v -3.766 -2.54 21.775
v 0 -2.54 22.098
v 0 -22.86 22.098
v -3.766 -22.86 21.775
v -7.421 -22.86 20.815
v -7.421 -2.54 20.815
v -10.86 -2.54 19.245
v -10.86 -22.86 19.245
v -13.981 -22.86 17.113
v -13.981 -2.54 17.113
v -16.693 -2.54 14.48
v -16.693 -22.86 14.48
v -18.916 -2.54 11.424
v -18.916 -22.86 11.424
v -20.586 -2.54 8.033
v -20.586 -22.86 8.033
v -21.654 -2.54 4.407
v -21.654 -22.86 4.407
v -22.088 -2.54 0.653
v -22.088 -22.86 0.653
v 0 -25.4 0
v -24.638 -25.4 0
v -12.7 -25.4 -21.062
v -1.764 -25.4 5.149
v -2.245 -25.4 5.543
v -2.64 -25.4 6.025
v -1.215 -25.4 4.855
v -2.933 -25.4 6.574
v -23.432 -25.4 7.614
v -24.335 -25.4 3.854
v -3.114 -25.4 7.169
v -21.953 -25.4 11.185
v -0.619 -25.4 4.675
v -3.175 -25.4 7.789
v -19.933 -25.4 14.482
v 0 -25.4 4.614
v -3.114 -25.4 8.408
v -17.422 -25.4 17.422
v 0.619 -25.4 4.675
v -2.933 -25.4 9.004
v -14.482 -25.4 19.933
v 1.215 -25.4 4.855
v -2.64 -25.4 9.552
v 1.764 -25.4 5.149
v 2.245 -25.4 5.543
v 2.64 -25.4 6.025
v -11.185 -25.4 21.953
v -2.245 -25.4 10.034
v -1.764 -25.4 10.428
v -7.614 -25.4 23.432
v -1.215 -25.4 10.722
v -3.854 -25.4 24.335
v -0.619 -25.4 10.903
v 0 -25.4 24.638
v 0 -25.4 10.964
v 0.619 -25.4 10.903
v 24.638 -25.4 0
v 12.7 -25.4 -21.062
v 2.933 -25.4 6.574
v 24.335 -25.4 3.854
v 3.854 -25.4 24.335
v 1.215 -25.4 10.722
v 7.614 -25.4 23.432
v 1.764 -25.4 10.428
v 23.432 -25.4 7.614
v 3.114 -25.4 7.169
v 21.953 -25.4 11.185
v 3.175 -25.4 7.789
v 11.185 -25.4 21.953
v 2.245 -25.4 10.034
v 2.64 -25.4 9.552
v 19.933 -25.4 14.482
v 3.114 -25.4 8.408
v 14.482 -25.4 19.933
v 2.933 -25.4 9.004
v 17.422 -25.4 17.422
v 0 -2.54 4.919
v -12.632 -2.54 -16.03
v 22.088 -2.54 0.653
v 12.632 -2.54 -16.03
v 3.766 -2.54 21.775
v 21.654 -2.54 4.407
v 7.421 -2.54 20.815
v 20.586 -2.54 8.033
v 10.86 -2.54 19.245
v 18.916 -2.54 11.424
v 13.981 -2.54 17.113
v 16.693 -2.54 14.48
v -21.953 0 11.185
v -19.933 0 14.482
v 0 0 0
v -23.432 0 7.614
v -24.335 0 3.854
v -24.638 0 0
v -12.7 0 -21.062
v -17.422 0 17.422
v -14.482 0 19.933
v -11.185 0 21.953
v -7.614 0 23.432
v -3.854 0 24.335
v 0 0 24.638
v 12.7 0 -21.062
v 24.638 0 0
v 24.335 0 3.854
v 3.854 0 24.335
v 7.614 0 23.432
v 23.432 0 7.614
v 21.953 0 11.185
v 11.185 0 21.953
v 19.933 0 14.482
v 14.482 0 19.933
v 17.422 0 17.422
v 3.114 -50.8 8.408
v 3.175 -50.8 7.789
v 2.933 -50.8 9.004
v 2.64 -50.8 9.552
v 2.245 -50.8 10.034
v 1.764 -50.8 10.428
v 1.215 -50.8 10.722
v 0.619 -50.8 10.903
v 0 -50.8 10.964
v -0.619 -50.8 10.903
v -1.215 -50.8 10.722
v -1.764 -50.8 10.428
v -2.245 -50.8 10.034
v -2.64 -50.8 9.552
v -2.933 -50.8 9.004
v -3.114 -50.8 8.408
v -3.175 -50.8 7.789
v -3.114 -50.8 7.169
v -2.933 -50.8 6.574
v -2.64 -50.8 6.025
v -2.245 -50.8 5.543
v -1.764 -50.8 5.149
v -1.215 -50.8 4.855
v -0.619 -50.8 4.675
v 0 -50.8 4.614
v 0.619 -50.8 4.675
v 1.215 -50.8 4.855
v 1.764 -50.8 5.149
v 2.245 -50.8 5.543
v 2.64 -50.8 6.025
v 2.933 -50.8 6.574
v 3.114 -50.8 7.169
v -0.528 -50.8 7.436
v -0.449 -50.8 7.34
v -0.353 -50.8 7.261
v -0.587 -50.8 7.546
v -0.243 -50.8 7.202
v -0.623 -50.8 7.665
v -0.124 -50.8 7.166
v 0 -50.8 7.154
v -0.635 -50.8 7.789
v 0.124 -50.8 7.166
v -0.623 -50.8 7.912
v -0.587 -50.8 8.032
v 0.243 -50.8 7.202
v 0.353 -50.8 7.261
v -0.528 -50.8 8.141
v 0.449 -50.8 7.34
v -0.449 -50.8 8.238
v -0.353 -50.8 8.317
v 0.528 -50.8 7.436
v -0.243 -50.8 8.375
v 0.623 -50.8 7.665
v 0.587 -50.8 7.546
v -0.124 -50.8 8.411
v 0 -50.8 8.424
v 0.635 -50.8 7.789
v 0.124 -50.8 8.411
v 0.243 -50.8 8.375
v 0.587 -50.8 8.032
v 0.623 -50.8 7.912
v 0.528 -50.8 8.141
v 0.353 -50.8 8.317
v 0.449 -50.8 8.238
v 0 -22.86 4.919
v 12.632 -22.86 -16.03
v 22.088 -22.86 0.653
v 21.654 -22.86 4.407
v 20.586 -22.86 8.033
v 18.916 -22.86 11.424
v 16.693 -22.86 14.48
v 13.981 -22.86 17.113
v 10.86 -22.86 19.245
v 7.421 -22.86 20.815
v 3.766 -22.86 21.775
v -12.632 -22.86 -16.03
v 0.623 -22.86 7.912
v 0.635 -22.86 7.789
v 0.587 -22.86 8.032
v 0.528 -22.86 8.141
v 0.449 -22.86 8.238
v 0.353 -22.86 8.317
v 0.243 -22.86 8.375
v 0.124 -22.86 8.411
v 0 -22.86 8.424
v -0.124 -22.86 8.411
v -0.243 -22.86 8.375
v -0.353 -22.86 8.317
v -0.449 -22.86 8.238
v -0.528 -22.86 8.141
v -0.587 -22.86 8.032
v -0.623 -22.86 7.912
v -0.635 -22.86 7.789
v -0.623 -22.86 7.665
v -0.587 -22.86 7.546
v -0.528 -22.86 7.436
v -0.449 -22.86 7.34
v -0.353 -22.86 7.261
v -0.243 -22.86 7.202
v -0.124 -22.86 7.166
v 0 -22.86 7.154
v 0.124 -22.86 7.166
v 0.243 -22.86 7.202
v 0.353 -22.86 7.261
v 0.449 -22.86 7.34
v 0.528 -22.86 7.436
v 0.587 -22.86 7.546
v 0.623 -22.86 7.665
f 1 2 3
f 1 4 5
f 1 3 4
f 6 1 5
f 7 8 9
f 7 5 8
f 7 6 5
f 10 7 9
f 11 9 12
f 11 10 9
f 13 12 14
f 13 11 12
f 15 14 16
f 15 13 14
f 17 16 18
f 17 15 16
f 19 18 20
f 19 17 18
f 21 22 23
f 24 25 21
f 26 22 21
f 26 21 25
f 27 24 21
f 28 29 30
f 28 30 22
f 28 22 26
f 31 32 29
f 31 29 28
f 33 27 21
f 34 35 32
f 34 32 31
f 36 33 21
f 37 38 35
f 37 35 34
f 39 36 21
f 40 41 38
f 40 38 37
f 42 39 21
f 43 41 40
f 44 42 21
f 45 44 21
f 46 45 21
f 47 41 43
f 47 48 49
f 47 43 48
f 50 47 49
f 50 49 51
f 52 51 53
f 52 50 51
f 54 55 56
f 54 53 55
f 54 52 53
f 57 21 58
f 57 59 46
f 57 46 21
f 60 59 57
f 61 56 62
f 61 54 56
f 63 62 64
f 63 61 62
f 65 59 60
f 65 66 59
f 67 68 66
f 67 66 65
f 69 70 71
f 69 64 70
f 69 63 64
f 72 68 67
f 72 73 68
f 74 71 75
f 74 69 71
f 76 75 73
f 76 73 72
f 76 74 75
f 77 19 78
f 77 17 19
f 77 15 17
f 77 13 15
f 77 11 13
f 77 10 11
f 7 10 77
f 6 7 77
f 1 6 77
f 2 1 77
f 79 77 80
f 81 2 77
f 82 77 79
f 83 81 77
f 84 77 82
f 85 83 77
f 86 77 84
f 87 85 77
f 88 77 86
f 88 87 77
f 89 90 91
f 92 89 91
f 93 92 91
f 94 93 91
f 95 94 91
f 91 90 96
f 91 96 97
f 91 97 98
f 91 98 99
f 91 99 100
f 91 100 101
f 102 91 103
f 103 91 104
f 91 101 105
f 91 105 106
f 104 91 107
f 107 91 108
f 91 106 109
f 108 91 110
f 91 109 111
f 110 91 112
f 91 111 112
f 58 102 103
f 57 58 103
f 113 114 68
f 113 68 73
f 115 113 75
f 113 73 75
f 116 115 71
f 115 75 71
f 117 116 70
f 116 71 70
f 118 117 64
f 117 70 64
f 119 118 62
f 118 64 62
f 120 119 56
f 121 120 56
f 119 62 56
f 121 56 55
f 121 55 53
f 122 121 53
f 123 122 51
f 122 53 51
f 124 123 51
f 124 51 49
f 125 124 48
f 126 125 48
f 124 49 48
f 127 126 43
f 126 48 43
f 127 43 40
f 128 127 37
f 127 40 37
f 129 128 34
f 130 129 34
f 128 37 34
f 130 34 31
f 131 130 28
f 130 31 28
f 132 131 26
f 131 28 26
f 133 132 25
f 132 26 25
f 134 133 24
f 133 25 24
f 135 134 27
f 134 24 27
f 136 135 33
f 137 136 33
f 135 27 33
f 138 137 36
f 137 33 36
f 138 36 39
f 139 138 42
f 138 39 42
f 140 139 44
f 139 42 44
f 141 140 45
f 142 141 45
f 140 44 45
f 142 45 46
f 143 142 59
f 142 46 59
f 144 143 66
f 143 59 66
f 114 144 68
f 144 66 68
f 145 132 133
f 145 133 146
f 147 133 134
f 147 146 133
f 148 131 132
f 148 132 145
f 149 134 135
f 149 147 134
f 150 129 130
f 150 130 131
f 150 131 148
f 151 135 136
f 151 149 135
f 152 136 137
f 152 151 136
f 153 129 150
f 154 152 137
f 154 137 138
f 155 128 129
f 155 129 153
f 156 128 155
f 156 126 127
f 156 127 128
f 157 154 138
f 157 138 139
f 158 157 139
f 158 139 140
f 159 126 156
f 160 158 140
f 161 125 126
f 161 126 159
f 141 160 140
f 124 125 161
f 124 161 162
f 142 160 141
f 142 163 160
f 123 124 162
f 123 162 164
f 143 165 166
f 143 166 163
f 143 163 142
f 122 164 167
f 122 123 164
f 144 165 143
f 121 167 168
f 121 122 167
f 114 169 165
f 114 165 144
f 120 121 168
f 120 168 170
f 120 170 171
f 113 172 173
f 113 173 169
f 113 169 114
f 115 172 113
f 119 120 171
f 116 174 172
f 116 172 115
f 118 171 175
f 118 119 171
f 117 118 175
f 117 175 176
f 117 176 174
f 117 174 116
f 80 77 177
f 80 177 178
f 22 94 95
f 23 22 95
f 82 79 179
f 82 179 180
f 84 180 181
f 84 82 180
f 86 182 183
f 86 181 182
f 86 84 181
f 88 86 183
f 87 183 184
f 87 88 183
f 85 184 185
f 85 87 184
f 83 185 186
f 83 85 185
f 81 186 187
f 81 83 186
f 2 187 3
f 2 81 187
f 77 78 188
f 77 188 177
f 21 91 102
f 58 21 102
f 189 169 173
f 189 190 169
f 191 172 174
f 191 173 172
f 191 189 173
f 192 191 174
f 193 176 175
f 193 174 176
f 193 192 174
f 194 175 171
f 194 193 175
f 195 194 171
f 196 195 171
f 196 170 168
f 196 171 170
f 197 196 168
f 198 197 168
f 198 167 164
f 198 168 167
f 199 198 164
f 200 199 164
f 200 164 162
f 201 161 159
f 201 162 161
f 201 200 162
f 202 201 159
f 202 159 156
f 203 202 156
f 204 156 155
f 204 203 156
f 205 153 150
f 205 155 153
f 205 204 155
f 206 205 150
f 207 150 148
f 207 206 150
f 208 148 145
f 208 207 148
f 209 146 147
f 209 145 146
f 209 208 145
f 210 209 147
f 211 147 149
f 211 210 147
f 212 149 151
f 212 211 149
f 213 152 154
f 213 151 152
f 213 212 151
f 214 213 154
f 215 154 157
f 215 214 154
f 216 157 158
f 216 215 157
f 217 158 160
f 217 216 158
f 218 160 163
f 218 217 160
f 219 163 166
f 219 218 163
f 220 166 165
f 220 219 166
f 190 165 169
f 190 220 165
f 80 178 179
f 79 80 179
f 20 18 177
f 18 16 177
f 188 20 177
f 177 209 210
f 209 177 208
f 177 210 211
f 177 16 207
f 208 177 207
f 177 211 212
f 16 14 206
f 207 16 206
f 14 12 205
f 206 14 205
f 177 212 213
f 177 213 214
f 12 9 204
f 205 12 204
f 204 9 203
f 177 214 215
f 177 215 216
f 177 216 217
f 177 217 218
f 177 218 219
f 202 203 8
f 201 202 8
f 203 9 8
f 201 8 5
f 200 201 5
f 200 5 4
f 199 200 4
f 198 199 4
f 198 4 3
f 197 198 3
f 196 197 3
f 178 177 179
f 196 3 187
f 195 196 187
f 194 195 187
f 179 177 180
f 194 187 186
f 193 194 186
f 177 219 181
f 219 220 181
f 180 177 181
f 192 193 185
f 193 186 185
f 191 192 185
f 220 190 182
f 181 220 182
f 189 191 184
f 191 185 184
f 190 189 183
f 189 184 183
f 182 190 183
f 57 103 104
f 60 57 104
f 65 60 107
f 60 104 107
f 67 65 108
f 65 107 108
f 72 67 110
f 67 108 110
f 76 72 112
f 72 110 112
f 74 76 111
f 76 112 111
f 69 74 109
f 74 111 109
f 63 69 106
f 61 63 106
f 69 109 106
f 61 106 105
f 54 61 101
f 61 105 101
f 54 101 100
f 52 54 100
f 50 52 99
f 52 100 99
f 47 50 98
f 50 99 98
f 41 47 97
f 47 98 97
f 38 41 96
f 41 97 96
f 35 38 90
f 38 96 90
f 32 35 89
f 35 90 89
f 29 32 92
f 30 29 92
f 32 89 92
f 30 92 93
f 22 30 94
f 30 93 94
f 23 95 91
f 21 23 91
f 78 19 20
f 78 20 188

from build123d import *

# Parameters (mm, degrees)
F1_DEPTH = 25.4
F2_R     = 3.175
F3_DEPTH = 25.4
F4_T     = -2.54


with BuildPart() as f1:
    # F0 (on Front) → F1 (new body)
    with BuildSketch(Plane.XZ):
        with BuildLine():
            ThreePointArc((24.638, 0), (17.4216968749, 17.4216968749), (0, 24.638))
            ThreePointArc((0, 24.638), (-17.4216968749, 17.4216968749), (-24.638, 0))
            Line((-24.638, 0), (-12.7, -21.0615165602))
            Line((-12.7, -21.0615165602), (0, 0))
            Line((0, 0), (12.7, -21.0615165602))
            Line((12.7, -21.0615165602), (24.638, 0))
        make_face()
    extrude(amount=F1_DEPTH)

    # F2 (on face) → F3 (join)
    with BuildSketch(Plane.XZ.offset(25.4)):
        with Locations((0, 7.7885312092)):
            Circle(F2_R)
    extrude(amount=F3_DEPTH)

    # F4
    f4_openings = [f1.faces().sort_by_distance(p)[0] for p in [
        (0, -50.8, 7.788531),
    ]]
    offset(amount=F4_T, openings=f4_openings, kind=Kind.INTERSECTION)


solid = f1.part
